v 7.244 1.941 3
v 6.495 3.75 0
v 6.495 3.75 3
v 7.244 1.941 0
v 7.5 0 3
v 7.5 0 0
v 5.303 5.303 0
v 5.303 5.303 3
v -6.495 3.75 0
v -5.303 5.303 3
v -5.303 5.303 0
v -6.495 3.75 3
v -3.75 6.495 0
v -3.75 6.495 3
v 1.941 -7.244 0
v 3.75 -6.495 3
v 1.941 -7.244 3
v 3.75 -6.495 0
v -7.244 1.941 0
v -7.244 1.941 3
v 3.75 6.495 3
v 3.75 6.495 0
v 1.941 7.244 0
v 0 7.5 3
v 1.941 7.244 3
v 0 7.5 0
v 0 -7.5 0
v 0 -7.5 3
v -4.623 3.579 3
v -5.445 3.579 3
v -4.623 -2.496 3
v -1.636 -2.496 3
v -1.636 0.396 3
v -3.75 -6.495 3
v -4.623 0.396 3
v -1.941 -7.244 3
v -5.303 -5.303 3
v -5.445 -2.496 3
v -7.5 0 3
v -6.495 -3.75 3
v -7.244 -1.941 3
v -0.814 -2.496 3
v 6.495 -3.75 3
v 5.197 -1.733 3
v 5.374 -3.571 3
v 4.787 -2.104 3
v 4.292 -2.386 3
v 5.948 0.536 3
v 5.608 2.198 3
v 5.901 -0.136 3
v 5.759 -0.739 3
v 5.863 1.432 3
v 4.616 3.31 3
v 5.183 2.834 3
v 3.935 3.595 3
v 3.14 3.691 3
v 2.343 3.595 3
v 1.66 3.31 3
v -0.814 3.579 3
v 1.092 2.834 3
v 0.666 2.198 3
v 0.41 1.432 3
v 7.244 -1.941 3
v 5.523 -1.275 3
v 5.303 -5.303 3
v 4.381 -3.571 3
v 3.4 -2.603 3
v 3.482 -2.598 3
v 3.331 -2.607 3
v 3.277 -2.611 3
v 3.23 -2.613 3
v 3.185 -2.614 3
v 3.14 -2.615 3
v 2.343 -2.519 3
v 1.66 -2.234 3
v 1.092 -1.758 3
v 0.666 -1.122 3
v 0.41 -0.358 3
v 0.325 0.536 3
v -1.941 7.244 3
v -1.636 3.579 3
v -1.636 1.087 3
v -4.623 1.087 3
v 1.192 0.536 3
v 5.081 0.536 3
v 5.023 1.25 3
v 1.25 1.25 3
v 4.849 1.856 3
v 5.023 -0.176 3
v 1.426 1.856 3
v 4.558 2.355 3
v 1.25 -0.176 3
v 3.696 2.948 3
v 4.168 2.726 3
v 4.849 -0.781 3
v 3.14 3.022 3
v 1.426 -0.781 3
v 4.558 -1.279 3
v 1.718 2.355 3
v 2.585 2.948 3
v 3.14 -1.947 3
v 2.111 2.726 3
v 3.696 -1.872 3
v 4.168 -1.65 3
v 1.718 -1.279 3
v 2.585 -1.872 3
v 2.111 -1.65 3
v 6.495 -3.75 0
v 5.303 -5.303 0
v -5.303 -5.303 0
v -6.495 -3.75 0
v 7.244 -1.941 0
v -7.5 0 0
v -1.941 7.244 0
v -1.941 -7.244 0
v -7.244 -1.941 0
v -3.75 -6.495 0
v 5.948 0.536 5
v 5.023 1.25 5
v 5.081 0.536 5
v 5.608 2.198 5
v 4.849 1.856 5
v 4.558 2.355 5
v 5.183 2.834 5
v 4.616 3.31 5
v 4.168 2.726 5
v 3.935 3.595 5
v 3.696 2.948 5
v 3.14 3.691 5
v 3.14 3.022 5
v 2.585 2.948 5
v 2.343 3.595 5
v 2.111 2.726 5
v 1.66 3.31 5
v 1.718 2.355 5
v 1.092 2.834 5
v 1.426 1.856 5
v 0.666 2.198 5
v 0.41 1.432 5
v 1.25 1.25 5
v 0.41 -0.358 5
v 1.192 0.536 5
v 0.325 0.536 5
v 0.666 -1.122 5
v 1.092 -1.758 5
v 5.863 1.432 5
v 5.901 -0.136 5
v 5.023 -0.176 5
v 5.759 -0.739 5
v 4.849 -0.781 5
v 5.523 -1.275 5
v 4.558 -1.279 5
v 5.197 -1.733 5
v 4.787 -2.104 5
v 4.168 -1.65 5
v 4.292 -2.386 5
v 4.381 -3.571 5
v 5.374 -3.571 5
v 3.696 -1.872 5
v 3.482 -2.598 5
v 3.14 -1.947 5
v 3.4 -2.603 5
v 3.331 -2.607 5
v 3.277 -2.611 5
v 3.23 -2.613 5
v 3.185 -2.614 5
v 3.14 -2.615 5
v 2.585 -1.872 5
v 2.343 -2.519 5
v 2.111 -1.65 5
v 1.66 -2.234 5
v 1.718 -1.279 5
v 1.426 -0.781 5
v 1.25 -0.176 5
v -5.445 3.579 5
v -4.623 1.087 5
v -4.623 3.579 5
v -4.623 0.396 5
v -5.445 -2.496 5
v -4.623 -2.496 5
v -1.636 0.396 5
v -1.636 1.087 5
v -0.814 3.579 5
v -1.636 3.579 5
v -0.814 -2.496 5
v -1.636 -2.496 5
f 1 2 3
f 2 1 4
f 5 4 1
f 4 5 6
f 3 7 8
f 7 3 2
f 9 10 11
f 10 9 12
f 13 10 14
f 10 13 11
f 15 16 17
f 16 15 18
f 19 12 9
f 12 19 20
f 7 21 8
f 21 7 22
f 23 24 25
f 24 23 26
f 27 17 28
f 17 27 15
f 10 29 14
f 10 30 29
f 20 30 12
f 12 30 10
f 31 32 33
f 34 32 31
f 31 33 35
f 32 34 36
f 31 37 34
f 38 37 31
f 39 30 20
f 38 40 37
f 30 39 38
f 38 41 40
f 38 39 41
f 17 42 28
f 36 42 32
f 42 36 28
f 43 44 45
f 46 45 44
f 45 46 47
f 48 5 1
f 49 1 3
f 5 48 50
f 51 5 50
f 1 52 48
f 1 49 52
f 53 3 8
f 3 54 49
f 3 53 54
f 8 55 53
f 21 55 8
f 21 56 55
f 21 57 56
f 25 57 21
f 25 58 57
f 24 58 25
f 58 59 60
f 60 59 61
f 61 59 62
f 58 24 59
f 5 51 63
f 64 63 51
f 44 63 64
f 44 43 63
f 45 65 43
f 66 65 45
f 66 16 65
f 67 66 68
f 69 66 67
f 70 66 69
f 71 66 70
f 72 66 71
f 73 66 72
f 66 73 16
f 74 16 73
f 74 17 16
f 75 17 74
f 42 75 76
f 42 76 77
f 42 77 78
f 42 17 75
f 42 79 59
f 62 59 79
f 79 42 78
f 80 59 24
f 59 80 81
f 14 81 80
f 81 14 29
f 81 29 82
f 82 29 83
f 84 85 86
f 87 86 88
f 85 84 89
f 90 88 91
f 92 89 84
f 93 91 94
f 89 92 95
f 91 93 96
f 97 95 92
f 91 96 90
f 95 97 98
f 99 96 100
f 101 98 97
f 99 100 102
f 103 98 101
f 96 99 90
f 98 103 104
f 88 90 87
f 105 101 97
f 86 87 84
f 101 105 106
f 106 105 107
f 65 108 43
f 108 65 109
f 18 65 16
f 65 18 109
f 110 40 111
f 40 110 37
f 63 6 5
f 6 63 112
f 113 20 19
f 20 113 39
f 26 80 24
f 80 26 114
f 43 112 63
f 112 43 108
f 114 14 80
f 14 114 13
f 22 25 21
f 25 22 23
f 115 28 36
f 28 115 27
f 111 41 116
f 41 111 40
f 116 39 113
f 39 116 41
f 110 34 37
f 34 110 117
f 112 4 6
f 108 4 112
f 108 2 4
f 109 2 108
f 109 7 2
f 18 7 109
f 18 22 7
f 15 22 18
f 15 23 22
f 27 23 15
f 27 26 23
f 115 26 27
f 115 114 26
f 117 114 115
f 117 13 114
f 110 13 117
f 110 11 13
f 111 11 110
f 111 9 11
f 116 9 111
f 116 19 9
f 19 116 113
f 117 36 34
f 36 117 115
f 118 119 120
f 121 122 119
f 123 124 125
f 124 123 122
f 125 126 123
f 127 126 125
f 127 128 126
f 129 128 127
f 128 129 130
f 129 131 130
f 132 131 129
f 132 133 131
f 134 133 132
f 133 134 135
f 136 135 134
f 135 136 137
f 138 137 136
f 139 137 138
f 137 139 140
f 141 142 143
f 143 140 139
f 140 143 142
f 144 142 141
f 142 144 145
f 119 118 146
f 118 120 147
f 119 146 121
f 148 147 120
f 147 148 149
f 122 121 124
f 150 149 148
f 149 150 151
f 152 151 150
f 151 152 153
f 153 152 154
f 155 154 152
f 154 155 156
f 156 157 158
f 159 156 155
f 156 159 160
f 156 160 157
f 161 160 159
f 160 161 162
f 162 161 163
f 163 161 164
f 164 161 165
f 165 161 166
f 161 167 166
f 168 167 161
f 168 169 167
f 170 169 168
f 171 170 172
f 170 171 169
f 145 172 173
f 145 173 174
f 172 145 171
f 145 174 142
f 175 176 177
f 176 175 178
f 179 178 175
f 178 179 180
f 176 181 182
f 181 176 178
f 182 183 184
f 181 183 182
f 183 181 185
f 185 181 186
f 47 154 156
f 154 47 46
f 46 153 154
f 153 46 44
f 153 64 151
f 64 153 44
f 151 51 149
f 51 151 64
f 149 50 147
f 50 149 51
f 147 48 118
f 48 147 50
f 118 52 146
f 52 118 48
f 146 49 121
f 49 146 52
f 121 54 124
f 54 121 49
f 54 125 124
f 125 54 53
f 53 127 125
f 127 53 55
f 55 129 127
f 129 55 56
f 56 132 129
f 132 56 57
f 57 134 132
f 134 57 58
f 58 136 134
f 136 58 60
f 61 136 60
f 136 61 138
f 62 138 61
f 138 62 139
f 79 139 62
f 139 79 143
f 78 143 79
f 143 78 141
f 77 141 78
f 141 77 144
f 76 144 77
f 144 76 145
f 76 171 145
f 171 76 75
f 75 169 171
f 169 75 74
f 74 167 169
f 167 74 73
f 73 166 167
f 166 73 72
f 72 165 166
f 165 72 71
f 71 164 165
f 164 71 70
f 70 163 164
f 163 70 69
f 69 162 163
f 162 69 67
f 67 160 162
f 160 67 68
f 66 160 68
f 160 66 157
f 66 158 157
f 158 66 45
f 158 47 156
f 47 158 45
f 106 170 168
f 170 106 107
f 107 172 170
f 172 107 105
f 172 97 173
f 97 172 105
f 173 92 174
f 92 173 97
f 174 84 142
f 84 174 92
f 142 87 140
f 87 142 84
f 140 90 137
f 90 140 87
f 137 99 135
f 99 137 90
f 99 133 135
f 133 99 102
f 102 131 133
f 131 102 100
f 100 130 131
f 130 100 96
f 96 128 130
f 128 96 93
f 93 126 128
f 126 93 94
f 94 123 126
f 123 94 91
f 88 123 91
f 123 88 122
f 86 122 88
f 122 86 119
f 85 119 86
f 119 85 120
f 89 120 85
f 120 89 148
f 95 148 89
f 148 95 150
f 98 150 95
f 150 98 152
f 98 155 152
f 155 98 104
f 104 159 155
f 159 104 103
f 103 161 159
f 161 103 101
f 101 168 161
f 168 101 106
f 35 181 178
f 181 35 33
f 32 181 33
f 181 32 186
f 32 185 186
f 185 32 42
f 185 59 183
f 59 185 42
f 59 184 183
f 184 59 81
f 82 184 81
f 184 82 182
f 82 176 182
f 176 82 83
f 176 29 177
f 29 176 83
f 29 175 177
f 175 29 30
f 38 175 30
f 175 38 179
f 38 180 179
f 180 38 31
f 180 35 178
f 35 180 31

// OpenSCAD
tailleCase=15;
translate([0,0,1.5])
cylinder(d=tailleCase,center=true,h=3);

translate([0,0,3])
{
    linear_extrude(2)
{    
text("HQ",font="HeroQuest",halign="center",valign="center",size=6);
}
}
